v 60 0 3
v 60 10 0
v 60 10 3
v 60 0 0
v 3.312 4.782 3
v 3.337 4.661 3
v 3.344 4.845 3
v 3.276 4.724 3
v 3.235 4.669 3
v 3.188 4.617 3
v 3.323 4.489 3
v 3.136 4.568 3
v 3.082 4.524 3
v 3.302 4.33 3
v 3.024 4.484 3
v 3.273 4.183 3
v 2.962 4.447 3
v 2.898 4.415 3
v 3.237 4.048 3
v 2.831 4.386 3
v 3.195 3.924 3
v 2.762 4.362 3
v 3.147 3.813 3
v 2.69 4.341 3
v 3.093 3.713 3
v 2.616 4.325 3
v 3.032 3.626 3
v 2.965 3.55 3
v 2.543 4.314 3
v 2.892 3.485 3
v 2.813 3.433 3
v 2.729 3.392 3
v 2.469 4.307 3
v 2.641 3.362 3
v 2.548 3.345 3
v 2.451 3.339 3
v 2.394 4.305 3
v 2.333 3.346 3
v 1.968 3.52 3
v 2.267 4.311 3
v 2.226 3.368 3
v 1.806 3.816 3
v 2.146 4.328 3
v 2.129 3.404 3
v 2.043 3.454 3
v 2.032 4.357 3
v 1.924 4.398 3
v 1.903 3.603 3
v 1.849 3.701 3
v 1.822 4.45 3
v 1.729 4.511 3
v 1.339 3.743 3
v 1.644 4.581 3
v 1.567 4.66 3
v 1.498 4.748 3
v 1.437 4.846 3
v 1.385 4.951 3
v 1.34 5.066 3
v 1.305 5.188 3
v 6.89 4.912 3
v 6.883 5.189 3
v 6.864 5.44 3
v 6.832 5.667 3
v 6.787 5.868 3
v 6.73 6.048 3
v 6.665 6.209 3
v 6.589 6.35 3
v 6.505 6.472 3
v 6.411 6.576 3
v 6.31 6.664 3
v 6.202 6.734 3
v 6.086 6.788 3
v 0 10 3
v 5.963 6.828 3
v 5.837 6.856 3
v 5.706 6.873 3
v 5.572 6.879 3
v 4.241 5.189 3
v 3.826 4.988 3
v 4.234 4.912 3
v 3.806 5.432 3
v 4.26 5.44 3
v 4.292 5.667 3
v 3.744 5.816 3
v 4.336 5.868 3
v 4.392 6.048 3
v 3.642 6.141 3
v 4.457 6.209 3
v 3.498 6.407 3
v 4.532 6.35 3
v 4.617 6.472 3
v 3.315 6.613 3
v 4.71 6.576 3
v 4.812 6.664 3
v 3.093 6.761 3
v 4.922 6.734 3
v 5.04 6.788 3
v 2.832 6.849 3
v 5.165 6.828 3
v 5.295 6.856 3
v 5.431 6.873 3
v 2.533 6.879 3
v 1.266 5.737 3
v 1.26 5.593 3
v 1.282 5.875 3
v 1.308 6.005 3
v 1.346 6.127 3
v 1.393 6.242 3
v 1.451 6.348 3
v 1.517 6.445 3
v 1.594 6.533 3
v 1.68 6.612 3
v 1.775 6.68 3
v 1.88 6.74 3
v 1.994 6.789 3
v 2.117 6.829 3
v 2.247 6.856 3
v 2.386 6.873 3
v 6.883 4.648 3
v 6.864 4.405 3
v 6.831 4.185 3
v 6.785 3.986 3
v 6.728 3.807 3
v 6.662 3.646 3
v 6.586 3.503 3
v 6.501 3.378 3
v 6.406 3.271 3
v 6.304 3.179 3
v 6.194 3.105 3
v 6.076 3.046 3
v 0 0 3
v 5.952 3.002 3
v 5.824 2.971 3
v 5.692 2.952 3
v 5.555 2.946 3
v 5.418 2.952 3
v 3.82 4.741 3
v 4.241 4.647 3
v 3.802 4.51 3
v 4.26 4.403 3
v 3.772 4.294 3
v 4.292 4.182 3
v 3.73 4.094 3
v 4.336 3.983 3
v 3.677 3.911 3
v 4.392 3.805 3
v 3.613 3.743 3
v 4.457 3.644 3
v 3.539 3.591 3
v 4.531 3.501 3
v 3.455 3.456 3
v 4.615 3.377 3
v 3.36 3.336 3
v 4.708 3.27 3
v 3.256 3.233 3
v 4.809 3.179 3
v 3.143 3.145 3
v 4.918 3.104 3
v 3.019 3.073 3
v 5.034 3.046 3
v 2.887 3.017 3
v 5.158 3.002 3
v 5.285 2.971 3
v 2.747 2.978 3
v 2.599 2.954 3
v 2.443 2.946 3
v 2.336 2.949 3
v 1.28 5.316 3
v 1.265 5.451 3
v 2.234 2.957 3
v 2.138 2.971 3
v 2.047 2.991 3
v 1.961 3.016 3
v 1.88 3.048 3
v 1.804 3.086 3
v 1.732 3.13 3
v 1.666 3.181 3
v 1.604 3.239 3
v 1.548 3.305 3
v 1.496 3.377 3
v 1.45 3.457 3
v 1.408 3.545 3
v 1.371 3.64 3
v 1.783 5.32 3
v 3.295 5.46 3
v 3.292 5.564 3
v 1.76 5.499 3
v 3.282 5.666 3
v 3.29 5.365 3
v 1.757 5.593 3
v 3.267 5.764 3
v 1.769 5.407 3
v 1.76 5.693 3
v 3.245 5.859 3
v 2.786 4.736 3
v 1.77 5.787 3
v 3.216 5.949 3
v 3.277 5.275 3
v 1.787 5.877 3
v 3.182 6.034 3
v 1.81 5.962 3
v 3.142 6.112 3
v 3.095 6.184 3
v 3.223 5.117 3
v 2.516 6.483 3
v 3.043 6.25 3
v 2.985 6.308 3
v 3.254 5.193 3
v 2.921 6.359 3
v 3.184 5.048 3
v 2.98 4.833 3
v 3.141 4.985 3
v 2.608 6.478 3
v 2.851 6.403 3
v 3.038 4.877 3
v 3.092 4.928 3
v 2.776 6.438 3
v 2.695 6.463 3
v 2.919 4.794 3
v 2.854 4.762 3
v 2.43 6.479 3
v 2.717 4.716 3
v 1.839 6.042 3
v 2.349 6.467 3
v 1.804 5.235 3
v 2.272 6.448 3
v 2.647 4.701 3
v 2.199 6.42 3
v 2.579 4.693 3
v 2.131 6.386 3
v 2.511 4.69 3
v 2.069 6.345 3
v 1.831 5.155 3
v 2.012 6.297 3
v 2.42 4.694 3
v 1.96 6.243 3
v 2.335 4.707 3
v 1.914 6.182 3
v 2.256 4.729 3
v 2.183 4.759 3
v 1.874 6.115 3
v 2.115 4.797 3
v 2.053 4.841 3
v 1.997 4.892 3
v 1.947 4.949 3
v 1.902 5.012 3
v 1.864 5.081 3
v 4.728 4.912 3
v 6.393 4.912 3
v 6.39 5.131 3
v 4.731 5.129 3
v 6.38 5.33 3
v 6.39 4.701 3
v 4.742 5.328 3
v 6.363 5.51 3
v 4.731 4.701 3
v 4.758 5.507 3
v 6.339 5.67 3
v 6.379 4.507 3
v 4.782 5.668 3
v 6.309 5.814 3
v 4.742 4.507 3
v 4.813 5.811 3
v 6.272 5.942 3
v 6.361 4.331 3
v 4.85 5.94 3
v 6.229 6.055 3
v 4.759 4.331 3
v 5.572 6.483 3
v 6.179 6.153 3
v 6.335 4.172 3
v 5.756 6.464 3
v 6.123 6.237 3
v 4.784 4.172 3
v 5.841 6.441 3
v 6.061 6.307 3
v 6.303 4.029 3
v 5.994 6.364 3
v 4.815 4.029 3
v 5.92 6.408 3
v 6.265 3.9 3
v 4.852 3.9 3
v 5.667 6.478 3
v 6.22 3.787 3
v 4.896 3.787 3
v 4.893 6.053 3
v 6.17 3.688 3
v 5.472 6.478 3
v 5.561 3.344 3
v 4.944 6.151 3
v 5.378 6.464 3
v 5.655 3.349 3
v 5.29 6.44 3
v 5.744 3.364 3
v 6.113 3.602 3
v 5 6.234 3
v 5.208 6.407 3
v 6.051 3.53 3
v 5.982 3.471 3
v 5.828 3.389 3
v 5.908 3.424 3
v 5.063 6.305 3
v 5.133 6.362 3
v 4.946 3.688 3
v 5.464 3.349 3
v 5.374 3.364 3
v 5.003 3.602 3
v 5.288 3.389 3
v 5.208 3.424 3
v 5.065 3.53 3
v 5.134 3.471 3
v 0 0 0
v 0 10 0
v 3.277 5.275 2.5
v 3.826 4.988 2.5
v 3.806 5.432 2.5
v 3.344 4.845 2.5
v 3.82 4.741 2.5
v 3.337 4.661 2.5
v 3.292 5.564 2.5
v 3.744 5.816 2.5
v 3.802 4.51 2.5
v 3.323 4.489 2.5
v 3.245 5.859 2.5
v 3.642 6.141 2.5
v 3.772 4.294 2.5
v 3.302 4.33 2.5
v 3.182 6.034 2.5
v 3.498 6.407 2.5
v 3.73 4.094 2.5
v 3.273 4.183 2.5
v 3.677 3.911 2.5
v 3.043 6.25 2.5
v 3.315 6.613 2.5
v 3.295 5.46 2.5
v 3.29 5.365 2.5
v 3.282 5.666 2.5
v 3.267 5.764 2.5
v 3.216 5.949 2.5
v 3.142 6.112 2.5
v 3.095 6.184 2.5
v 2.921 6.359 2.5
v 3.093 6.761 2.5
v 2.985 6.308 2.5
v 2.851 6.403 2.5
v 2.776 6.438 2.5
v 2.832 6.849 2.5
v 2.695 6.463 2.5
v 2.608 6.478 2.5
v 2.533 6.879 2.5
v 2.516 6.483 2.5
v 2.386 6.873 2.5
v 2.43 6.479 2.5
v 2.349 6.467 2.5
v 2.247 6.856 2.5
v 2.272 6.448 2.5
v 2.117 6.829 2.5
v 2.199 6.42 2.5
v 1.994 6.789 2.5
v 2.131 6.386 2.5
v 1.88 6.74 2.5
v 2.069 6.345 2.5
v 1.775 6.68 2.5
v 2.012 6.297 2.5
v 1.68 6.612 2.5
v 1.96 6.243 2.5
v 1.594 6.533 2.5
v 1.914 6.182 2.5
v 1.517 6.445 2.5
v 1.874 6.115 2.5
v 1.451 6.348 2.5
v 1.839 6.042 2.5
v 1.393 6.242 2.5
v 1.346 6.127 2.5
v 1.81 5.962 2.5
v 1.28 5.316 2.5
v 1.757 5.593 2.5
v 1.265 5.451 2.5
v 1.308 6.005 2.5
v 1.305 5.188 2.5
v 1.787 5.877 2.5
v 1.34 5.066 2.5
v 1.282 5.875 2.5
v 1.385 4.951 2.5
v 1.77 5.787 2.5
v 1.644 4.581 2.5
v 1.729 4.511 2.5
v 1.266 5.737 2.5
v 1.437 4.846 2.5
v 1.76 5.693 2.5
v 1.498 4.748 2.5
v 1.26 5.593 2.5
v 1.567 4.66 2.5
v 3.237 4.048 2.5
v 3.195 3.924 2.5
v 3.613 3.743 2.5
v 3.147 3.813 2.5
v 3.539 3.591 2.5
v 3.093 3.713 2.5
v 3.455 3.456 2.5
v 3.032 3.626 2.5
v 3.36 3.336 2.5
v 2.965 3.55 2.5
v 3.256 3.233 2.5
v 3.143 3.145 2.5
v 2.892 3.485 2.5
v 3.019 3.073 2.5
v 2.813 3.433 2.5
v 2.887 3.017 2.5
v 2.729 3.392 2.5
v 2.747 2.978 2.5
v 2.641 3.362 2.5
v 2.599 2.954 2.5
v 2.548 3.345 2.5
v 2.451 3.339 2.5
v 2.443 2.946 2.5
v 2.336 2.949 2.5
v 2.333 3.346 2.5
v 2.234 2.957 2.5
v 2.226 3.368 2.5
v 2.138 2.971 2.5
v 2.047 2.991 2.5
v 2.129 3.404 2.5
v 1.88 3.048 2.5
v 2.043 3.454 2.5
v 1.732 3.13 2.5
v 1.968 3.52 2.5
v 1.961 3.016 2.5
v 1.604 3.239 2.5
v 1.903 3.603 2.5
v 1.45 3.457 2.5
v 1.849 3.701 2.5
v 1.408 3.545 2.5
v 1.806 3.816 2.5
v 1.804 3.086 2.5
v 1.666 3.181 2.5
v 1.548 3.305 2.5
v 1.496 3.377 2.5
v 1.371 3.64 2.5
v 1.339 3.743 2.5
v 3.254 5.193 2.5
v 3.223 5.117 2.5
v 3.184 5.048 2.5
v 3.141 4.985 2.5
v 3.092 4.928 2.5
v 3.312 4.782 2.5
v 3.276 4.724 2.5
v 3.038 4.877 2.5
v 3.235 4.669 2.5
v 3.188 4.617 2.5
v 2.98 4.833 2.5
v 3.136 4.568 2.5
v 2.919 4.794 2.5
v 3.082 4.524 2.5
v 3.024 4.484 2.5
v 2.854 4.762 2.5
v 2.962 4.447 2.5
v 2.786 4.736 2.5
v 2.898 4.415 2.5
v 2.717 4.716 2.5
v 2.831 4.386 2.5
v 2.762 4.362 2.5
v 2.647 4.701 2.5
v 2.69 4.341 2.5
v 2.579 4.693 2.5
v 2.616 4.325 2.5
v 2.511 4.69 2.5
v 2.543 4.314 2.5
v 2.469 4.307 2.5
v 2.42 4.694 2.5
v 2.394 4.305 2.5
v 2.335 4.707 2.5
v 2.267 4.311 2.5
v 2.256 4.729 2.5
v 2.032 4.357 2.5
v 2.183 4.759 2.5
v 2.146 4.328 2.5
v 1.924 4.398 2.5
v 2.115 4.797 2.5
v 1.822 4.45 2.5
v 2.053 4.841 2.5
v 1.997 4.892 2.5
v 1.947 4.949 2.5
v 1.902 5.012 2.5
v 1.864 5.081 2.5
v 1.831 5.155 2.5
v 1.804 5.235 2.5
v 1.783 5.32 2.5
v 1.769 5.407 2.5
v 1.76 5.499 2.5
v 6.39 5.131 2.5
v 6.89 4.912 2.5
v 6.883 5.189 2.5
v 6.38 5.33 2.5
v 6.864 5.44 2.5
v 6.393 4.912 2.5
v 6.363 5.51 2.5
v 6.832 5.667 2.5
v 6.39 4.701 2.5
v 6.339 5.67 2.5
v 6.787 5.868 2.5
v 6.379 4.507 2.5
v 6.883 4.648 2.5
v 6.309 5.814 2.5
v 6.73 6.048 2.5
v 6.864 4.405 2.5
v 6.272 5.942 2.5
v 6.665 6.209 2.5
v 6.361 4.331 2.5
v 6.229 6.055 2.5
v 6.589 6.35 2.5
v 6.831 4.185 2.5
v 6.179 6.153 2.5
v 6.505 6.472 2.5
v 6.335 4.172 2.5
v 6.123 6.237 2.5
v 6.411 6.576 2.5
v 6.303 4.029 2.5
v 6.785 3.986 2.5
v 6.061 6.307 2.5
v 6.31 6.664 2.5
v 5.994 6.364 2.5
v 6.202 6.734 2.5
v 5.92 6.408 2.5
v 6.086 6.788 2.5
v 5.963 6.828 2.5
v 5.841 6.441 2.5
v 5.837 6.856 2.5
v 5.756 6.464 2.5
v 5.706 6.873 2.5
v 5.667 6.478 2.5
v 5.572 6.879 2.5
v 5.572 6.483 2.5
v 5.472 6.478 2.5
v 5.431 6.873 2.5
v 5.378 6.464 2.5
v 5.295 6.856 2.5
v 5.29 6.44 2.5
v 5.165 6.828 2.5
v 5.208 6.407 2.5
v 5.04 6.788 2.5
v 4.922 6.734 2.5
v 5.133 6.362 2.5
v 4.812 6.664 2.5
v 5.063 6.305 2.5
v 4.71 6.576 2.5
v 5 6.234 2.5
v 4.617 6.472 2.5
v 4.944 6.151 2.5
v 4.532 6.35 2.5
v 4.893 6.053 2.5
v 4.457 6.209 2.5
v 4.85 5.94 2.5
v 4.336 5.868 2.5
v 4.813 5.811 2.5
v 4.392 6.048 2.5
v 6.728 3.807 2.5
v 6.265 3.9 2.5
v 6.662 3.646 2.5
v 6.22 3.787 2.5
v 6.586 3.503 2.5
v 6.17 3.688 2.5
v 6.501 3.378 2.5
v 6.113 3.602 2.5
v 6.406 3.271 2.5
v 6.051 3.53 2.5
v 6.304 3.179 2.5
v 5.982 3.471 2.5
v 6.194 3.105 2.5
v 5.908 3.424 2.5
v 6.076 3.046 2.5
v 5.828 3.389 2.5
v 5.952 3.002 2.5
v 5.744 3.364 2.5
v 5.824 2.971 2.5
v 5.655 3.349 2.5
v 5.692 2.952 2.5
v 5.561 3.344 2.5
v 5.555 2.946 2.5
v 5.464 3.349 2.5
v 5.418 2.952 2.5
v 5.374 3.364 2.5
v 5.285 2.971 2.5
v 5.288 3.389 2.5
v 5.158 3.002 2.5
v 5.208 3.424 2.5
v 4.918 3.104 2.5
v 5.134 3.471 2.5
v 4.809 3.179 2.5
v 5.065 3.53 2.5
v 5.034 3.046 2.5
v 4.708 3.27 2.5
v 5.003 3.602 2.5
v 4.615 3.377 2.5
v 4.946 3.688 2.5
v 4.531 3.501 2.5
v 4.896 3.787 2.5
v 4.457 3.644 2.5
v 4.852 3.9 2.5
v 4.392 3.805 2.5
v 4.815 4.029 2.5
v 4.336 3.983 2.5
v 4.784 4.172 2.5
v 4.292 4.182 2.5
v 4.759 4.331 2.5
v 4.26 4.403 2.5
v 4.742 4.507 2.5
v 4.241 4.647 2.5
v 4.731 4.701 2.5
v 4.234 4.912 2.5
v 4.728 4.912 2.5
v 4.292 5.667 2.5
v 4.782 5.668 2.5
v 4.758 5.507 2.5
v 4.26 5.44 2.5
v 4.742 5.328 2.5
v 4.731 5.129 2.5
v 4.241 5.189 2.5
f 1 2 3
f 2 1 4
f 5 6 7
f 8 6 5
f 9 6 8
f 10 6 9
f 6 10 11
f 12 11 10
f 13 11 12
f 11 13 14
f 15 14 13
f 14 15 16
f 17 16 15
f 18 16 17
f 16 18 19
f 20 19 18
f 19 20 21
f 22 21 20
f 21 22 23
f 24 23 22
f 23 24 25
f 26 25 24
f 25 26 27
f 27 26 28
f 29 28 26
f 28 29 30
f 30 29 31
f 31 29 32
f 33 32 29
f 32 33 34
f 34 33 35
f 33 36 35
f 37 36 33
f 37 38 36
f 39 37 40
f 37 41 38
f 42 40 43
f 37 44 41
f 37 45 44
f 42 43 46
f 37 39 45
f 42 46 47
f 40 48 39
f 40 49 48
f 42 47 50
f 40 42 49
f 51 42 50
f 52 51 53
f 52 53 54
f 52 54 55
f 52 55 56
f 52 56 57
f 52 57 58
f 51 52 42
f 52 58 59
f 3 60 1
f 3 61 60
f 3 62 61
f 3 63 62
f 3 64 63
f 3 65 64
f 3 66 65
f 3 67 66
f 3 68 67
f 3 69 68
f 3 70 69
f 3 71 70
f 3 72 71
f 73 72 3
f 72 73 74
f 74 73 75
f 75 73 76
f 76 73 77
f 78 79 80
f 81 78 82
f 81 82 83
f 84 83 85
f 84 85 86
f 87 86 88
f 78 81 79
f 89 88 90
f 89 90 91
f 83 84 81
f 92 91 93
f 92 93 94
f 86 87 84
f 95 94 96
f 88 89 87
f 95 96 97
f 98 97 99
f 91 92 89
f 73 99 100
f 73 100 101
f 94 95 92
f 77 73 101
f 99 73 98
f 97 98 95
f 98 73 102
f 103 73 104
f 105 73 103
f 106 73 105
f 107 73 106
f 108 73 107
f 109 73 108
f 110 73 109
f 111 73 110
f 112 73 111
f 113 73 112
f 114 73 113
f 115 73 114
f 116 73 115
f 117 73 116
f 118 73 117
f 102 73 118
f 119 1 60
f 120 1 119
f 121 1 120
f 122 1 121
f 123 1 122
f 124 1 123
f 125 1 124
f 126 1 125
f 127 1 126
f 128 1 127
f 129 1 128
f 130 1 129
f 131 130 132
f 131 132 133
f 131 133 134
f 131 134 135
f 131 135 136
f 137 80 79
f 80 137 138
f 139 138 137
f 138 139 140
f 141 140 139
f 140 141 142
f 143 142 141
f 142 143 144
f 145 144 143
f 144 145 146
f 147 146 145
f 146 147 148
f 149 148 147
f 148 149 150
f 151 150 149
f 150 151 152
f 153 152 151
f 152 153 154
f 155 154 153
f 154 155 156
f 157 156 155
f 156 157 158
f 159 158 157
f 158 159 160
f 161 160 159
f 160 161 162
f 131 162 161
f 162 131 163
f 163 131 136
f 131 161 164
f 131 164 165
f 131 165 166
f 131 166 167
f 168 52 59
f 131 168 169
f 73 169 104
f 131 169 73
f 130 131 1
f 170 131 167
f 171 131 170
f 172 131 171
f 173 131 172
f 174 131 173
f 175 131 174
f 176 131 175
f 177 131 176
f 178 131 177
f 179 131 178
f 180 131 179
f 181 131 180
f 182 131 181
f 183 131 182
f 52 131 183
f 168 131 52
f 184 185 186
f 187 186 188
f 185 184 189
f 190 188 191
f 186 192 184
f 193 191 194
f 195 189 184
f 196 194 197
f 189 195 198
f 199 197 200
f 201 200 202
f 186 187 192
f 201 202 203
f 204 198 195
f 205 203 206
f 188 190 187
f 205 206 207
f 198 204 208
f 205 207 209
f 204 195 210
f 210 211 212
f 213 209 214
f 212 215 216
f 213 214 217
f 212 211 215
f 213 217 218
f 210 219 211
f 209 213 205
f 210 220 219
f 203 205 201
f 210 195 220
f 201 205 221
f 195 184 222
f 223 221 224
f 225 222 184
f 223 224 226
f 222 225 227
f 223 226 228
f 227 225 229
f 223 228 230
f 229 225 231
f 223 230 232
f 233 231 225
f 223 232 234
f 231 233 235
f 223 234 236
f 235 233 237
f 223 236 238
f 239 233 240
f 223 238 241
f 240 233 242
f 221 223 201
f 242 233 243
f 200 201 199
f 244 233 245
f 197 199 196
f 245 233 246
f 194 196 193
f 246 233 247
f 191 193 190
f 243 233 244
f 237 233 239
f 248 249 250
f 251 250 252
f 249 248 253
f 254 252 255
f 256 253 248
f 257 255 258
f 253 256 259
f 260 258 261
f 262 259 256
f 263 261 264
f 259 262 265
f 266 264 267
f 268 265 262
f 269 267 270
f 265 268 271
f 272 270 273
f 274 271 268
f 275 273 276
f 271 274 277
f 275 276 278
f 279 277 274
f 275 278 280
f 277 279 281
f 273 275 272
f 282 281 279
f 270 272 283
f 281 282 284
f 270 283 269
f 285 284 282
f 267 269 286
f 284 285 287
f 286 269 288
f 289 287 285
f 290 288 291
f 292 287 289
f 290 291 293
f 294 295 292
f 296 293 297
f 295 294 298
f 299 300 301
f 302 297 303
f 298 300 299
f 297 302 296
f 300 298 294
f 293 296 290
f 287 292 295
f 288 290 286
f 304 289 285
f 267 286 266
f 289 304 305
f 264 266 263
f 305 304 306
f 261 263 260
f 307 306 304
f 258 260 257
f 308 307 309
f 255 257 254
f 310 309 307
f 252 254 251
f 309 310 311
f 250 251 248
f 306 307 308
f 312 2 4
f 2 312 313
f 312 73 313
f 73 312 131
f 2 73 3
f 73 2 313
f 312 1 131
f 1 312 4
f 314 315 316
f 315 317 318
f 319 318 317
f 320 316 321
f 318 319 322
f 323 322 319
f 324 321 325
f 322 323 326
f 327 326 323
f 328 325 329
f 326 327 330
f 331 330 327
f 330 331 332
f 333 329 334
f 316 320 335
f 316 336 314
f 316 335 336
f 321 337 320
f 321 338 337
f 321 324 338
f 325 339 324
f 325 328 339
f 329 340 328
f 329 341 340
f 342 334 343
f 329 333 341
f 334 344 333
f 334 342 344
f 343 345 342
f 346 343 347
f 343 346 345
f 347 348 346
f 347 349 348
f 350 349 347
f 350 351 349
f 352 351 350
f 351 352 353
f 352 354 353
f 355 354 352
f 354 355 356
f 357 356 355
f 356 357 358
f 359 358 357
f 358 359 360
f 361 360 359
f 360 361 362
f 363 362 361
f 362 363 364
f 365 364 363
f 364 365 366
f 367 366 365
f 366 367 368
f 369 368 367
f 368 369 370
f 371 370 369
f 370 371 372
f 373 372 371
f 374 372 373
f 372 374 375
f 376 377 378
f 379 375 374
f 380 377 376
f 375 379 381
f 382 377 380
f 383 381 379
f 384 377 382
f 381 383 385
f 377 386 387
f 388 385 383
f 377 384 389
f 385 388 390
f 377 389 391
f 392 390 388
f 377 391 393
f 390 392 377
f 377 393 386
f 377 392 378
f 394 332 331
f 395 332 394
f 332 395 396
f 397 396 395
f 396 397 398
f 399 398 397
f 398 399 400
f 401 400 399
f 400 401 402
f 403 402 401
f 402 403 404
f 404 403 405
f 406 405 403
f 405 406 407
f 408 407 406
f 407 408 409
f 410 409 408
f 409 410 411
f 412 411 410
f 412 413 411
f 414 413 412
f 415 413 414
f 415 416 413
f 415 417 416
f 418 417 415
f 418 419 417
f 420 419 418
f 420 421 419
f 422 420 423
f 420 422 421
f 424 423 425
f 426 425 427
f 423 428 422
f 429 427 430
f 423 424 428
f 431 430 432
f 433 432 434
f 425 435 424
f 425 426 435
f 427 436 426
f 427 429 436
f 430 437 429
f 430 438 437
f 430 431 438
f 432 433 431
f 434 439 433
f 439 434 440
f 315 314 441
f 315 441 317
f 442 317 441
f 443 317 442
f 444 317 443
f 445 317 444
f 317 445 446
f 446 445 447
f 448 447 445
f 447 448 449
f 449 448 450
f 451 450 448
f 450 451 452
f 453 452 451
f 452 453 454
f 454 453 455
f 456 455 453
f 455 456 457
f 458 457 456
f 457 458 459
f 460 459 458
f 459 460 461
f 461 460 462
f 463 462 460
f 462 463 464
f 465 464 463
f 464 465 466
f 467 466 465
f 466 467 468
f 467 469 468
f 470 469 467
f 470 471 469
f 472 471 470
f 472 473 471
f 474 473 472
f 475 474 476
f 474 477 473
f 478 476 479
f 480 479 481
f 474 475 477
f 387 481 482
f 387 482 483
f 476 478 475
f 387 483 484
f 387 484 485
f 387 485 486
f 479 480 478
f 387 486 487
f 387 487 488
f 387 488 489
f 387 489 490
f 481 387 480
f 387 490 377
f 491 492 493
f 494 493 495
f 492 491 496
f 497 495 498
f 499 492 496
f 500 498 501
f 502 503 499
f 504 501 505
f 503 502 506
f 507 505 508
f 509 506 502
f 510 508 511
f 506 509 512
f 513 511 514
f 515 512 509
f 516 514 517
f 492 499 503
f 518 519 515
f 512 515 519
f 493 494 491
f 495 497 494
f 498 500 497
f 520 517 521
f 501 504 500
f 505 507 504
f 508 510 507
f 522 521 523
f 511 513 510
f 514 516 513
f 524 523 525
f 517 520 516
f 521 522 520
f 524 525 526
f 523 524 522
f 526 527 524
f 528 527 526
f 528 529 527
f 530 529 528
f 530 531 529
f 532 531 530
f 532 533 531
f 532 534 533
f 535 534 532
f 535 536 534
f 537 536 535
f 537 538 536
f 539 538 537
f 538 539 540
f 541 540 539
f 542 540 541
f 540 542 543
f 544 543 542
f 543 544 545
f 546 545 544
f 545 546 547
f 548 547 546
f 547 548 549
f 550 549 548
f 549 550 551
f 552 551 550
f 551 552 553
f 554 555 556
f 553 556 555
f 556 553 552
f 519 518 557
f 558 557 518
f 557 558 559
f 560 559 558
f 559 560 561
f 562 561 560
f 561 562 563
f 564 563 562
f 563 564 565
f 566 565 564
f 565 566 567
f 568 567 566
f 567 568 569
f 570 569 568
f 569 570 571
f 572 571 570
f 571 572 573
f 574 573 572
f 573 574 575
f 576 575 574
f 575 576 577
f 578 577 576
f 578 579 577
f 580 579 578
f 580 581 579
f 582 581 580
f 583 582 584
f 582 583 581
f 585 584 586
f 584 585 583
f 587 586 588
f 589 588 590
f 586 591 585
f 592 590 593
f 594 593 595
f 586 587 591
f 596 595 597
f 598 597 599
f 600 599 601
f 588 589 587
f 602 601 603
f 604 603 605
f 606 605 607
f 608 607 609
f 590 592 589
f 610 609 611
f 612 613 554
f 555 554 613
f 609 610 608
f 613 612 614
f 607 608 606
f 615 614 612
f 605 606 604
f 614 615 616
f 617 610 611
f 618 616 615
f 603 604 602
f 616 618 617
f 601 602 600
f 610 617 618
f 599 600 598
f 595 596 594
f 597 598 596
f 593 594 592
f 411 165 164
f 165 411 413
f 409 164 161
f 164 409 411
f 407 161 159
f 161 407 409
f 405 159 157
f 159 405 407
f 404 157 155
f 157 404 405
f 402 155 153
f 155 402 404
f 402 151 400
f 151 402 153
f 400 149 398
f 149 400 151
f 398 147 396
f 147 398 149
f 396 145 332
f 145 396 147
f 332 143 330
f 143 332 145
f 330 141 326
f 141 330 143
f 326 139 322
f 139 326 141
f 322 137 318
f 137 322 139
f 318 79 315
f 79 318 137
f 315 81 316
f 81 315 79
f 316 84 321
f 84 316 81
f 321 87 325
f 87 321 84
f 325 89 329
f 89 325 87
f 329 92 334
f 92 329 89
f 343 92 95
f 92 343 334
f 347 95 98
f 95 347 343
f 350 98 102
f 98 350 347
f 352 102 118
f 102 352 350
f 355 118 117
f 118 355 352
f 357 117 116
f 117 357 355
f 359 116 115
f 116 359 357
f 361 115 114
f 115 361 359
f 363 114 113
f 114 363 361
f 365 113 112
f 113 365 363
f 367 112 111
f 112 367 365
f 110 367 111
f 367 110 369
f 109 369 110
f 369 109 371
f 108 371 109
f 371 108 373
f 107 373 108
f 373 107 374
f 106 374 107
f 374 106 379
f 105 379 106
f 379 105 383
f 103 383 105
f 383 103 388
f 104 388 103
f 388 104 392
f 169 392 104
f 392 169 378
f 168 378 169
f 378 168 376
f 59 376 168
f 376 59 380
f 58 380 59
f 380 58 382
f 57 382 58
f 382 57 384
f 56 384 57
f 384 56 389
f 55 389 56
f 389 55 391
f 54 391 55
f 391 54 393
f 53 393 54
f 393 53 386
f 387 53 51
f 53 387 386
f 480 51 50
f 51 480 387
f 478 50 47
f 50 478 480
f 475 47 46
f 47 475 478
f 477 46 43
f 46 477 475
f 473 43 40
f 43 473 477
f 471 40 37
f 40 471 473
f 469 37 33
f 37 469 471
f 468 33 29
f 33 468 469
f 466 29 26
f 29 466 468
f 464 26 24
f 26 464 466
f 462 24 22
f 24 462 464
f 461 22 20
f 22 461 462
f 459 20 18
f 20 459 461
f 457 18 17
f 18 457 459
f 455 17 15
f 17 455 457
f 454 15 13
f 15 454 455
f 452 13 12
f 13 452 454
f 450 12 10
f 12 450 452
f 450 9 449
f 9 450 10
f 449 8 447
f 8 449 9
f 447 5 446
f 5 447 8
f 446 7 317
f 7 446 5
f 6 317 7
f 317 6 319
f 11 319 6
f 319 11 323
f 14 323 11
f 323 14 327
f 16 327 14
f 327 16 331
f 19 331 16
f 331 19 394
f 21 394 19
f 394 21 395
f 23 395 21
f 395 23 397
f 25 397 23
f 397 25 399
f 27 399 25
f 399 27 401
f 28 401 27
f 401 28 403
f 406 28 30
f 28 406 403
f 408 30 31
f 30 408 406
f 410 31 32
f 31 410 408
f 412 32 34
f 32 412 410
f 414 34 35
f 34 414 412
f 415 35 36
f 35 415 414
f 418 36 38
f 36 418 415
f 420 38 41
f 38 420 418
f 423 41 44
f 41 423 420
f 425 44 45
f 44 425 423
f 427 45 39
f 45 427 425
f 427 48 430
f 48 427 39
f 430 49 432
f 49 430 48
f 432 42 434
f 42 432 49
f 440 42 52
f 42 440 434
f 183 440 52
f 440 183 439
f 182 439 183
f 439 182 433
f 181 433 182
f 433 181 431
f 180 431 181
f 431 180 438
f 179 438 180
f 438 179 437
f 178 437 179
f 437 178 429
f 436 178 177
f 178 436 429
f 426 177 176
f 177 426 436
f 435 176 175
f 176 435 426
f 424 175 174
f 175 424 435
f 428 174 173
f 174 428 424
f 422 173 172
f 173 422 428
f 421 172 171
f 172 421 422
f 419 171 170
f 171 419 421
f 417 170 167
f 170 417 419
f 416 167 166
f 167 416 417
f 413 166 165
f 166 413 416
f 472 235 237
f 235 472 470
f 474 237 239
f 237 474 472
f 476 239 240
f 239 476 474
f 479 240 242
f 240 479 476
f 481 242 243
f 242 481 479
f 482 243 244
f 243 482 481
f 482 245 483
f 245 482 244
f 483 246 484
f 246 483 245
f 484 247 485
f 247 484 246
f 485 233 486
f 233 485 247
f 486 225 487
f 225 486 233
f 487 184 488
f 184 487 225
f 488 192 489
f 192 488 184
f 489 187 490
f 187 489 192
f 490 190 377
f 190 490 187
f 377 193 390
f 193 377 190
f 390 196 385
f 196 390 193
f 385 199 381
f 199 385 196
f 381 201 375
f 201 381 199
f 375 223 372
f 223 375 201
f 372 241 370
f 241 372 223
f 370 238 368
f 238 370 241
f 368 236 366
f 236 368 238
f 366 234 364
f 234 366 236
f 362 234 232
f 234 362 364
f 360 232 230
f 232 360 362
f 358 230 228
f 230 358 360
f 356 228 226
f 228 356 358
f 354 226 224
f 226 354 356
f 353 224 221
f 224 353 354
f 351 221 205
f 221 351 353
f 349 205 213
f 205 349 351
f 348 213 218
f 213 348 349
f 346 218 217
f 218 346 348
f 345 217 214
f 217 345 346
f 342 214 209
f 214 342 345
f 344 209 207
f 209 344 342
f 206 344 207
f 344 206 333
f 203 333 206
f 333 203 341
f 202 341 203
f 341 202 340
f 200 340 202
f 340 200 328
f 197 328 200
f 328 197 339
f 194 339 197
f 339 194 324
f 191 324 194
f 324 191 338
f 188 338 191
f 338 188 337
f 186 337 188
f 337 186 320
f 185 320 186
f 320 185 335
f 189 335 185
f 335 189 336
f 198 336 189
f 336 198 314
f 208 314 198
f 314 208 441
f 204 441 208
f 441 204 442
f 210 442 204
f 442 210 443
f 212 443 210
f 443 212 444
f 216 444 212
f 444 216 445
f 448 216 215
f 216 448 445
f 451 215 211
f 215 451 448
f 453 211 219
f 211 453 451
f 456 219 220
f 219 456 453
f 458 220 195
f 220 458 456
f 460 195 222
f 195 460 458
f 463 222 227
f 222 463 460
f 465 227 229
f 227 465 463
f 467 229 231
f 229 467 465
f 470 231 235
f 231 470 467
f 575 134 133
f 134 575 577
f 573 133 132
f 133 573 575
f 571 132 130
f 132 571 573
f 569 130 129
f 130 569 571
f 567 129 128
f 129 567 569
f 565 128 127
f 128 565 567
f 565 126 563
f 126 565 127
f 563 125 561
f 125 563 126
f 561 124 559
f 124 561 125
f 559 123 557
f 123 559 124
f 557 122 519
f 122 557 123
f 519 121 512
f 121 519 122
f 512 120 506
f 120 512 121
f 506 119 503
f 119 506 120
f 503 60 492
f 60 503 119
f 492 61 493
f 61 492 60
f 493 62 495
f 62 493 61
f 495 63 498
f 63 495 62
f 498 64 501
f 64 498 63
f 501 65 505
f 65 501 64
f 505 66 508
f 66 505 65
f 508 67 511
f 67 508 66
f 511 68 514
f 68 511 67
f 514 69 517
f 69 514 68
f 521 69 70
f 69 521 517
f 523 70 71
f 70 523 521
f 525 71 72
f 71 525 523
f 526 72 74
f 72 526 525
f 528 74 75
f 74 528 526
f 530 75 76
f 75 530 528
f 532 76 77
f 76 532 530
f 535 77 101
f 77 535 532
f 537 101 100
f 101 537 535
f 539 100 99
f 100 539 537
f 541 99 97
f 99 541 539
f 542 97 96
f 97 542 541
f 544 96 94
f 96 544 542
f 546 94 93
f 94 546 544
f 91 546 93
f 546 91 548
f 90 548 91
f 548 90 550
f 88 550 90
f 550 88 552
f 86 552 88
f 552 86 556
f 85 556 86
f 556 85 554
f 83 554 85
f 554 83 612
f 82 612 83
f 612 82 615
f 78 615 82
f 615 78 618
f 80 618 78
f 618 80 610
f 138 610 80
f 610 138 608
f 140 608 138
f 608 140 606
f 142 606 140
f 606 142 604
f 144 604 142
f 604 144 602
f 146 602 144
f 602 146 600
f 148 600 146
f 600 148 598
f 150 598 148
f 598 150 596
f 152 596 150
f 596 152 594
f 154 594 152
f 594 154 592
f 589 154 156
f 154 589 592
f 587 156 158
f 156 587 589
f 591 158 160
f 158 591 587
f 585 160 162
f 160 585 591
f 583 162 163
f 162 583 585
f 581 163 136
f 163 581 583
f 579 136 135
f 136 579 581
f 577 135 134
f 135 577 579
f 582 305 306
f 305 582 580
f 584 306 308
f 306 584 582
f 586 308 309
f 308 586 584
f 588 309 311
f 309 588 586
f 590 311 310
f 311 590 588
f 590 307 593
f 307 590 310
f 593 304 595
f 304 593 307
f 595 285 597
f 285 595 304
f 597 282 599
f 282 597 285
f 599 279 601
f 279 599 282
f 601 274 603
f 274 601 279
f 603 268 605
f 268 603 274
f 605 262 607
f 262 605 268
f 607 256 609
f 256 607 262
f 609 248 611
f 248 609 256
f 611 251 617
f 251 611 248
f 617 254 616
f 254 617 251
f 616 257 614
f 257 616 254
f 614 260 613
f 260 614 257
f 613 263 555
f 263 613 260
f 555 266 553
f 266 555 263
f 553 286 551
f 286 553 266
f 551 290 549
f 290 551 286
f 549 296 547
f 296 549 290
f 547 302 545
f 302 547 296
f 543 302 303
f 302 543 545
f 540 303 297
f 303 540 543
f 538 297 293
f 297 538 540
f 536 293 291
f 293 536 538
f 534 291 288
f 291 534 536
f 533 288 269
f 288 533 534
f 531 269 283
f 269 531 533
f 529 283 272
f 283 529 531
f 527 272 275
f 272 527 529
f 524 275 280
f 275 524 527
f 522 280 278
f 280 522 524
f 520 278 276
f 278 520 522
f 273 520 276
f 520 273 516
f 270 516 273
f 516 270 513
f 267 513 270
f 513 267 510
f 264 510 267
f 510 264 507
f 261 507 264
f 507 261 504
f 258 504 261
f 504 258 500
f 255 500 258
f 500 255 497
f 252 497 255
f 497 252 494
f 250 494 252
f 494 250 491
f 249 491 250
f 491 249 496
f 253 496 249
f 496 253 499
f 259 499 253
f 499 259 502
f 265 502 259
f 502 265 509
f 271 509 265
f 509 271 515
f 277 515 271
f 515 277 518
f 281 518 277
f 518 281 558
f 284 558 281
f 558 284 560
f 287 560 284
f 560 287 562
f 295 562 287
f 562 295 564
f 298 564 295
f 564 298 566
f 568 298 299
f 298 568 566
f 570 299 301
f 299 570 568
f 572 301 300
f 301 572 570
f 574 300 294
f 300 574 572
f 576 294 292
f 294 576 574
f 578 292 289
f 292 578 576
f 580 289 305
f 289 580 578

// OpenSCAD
$fn = 25;

difference() {
  cube([60, 10, 3]);
  translate([1, 3, 2.5])
  linear_extrude(height = 1) {
    text("90", size=4);
  }
}
